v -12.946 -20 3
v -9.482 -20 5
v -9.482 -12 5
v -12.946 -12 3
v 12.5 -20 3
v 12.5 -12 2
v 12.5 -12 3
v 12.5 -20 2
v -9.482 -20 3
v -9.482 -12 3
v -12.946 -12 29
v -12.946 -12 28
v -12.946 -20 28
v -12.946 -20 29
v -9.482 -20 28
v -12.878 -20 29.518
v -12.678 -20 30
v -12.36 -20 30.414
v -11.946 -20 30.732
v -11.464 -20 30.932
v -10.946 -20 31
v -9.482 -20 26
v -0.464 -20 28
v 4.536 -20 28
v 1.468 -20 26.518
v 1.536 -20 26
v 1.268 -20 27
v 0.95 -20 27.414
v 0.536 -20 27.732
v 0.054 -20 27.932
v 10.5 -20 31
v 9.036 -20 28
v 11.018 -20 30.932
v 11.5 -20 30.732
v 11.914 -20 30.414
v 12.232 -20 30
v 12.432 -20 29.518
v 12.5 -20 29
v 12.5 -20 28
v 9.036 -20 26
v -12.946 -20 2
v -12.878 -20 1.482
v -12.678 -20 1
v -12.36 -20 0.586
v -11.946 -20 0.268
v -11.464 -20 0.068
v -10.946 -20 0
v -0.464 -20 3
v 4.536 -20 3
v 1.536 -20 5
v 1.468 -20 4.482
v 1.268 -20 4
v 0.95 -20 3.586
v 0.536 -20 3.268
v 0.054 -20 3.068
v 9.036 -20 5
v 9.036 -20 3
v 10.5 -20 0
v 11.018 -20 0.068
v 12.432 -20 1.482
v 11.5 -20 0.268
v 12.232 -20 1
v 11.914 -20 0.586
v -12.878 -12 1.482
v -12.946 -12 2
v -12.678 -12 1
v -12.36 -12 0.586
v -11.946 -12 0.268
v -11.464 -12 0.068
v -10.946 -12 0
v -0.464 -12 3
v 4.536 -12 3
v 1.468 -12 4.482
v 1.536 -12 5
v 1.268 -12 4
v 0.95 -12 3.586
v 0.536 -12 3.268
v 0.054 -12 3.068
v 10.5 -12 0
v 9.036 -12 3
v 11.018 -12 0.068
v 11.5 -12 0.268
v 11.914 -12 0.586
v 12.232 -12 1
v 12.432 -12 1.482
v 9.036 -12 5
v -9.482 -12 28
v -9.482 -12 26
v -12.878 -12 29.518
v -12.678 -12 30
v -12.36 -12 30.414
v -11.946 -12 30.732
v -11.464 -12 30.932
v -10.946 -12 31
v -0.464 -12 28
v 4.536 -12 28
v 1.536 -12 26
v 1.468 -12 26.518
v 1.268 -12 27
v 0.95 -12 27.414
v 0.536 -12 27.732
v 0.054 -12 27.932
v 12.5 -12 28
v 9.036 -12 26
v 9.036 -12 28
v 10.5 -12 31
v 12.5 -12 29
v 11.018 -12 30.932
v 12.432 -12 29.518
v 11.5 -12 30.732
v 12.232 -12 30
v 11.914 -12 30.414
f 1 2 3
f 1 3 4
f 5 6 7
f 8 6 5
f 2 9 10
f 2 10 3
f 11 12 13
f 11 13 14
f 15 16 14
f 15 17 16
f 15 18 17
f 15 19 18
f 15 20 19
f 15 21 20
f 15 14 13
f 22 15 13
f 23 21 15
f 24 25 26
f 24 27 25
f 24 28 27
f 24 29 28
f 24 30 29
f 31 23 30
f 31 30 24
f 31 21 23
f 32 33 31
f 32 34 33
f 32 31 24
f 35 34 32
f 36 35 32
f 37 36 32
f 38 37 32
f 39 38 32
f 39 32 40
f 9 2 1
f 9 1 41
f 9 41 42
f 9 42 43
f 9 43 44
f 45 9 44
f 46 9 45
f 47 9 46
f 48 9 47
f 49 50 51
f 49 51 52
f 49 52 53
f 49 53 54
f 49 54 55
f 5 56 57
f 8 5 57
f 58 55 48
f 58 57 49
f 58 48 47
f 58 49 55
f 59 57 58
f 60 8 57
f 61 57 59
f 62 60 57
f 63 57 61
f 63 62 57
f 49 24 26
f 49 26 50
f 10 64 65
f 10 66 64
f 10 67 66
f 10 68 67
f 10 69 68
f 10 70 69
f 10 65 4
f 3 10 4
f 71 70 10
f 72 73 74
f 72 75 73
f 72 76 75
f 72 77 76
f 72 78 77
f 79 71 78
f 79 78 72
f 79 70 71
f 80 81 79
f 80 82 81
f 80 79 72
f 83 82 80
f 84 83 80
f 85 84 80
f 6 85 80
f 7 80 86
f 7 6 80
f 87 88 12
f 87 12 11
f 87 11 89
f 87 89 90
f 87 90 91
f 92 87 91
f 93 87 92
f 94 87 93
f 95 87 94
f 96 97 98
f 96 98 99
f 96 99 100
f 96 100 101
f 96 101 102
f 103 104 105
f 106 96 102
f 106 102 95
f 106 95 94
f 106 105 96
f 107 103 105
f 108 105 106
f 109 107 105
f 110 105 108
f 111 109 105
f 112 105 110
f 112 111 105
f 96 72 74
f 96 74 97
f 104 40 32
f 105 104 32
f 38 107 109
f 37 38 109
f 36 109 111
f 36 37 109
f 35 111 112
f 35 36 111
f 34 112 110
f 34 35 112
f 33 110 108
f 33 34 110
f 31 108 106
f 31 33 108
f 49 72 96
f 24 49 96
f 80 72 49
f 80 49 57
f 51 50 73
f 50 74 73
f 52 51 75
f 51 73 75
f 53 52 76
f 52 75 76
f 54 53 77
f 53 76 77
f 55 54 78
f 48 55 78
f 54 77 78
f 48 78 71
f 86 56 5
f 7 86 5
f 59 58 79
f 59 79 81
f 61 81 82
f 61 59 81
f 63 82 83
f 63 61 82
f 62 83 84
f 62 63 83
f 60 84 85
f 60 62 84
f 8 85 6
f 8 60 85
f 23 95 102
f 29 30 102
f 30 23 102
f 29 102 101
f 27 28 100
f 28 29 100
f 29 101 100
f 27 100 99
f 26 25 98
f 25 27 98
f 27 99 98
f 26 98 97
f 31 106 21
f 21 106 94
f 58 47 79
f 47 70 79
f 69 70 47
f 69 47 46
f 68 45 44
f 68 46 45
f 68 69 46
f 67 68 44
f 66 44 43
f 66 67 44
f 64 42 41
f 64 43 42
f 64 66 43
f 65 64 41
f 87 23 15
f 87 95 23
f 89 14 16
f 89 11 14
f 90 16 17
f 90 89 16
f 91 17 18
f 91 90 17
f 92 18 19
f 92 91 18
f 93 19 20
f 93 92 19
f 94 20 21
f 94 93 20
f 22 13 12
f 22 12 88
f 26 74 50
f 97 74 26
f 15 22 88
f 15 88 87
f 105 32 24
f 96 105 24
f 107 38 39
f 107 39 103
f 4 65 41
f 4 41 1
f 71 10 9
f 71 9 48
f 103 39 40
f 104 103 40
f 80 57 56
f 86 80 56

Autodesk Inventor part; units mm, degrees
ref_plane "YZ Plane" through (0, 0, 0) normal (1, 0, 0) x (0, 1, 0)
sketch "Sketch1" plane through (0, 0, 0) normal (0, 0, 1) x (1, 0, 0)
  line L0 (-12.5, -12) -> (12.5, -12)
  line L1 (12.5, -12) -> (12.5, -20)
  line L2 (12.5, -20) -> (-12.5, -20)
  line L3 (-12.5, -20) -> (-12.5, -12)
  point P0 (0, 0)
  dimension "d0" = 25
  dimension "d1" = 8
  dimension "d2" = 12.5
  dimension "d3" = 20
extrude "Extrusion1" add sketch "Sketch1" along normal blind 3
sketch "Sketch3" plane through (-12.5, -20, 0) normal (0, -1, 0) x (1, 0, 0)
  line L0 (25, 3) -> (0, 3) projected
  line L1 (25, 0) -> (25, 3) projected
  line L2 (21.5359, 3) -> (21.5359, 5)
  line L3 (25, 3) -> (21.5359, 3)
  line L4 (25, 0) -> (0, 0) projected
  line L5 (21.5359, 5) -> (25, 3)
  point P0 (12.5, 0)
  dimension "d9" = 2
  dimension "d11" = 0
  dimension "d15" = 30
extrude "Extrusion2" add sketch "Sketch3" against normal blind 8
ref_plane "Work Plane1" through (4.5359, -20, 3) normal (-1, 0, 0) x (0, 0, 1)
sketch "Sketch4" plane through (4.5359, -20, 3) normal (-1, 0, 0) x (0, 0, 1)
  line L0 (0, 8) -> (12.5, 8)
  line L1 (12.5, 8) -> (12.5, 0)
  line L2 (12.5, 0) -> (0, 0)
  line L3 (0, 0) -> (0, 8)
  point P0 (-3, 20)
  dimension "d16" = 12.5
  dimension "d17" = 8
  dimension "d18" = 12
  dimension "d19" = 3
extrude "Extrusion3" add sketch "Sketch4" along normal blind 3
ref_plane "Work Plane2" through (-9.4641, -20, 3) normal (-1, 0, 0) x (0, 0, 1)
sketch "Sketch5" plane through (-12.5, -20, 0) normal (0, -1, 0) x (1, 0, 0)
  line L0 (21.5359, 3) -> (17.0359, 3) projected
  line L1 (17.0359, 15.5) -> (17.0359, 3) projected
  line L2 (17.0359, 15.5) -> (14.0359, 15.5) projected
  line L3 (14.0359, 15.5) -> (14.0359, 3) projected
  line L4 (14.0359, 3) -> (0, 3) projected
  line L5 (0, 0) -> (0, 3) projected
  line L6 (25, 0) -> (0, 0) projected
  line L7 (25, 0) -> (25, 3) projected
  line L8 (21.5359, 5) -> (25, 3) projected
  line L9 (21.5359, 3) -> (21.5359, 5) projected
  line L10 (3.018, 3) -> (3.018, 5)
  line L11 (3.018, 5) -> (-0.4461, 3)
  line L12 (-0.4461, 3) -> (3.018, 3)
  line L13 (-0.4461, 3) -> (0, 3)
  line L14 (0, 3) -> (0, 0)
  line L15 (0, 0) -> (-0.4461, 0)
  line L16 (-0.4461, 0) -> (-0.4461, 3)
  point P0 (12.5, 0)
  dimension "d23" = 2
  dimension "d24" = 60
extrude "Extrusion4" add sketch "Sketch5" against normal blind 8
mirror "Mirror1" about plane through (4.5359, -12, 15.5) normal (0, 0, 1) of "Extrusion1", "Extrusion2", "Extrusion3", "Extrusion4"
fillet "Fillet1" radius 2 2 edges at (1.5359, -16, 28) (1.5359, -16, 3)
fillet "Fillet2" radius 2 4 edges at (-12.9461, -16, 31) (-12.9461, -16, 0) (12.5, -16, 31) (12.5, -16, 0)
ref_plane "Work Plane3" through (4.5359, -20, 28) normal (1, 0, 0) x (0, 0, -1)
ref_plane "Work Plane4" through (-9.4641, -20, 28) normal (1, 0, 0) x (0, 0, -1)
properties part number "claw"
